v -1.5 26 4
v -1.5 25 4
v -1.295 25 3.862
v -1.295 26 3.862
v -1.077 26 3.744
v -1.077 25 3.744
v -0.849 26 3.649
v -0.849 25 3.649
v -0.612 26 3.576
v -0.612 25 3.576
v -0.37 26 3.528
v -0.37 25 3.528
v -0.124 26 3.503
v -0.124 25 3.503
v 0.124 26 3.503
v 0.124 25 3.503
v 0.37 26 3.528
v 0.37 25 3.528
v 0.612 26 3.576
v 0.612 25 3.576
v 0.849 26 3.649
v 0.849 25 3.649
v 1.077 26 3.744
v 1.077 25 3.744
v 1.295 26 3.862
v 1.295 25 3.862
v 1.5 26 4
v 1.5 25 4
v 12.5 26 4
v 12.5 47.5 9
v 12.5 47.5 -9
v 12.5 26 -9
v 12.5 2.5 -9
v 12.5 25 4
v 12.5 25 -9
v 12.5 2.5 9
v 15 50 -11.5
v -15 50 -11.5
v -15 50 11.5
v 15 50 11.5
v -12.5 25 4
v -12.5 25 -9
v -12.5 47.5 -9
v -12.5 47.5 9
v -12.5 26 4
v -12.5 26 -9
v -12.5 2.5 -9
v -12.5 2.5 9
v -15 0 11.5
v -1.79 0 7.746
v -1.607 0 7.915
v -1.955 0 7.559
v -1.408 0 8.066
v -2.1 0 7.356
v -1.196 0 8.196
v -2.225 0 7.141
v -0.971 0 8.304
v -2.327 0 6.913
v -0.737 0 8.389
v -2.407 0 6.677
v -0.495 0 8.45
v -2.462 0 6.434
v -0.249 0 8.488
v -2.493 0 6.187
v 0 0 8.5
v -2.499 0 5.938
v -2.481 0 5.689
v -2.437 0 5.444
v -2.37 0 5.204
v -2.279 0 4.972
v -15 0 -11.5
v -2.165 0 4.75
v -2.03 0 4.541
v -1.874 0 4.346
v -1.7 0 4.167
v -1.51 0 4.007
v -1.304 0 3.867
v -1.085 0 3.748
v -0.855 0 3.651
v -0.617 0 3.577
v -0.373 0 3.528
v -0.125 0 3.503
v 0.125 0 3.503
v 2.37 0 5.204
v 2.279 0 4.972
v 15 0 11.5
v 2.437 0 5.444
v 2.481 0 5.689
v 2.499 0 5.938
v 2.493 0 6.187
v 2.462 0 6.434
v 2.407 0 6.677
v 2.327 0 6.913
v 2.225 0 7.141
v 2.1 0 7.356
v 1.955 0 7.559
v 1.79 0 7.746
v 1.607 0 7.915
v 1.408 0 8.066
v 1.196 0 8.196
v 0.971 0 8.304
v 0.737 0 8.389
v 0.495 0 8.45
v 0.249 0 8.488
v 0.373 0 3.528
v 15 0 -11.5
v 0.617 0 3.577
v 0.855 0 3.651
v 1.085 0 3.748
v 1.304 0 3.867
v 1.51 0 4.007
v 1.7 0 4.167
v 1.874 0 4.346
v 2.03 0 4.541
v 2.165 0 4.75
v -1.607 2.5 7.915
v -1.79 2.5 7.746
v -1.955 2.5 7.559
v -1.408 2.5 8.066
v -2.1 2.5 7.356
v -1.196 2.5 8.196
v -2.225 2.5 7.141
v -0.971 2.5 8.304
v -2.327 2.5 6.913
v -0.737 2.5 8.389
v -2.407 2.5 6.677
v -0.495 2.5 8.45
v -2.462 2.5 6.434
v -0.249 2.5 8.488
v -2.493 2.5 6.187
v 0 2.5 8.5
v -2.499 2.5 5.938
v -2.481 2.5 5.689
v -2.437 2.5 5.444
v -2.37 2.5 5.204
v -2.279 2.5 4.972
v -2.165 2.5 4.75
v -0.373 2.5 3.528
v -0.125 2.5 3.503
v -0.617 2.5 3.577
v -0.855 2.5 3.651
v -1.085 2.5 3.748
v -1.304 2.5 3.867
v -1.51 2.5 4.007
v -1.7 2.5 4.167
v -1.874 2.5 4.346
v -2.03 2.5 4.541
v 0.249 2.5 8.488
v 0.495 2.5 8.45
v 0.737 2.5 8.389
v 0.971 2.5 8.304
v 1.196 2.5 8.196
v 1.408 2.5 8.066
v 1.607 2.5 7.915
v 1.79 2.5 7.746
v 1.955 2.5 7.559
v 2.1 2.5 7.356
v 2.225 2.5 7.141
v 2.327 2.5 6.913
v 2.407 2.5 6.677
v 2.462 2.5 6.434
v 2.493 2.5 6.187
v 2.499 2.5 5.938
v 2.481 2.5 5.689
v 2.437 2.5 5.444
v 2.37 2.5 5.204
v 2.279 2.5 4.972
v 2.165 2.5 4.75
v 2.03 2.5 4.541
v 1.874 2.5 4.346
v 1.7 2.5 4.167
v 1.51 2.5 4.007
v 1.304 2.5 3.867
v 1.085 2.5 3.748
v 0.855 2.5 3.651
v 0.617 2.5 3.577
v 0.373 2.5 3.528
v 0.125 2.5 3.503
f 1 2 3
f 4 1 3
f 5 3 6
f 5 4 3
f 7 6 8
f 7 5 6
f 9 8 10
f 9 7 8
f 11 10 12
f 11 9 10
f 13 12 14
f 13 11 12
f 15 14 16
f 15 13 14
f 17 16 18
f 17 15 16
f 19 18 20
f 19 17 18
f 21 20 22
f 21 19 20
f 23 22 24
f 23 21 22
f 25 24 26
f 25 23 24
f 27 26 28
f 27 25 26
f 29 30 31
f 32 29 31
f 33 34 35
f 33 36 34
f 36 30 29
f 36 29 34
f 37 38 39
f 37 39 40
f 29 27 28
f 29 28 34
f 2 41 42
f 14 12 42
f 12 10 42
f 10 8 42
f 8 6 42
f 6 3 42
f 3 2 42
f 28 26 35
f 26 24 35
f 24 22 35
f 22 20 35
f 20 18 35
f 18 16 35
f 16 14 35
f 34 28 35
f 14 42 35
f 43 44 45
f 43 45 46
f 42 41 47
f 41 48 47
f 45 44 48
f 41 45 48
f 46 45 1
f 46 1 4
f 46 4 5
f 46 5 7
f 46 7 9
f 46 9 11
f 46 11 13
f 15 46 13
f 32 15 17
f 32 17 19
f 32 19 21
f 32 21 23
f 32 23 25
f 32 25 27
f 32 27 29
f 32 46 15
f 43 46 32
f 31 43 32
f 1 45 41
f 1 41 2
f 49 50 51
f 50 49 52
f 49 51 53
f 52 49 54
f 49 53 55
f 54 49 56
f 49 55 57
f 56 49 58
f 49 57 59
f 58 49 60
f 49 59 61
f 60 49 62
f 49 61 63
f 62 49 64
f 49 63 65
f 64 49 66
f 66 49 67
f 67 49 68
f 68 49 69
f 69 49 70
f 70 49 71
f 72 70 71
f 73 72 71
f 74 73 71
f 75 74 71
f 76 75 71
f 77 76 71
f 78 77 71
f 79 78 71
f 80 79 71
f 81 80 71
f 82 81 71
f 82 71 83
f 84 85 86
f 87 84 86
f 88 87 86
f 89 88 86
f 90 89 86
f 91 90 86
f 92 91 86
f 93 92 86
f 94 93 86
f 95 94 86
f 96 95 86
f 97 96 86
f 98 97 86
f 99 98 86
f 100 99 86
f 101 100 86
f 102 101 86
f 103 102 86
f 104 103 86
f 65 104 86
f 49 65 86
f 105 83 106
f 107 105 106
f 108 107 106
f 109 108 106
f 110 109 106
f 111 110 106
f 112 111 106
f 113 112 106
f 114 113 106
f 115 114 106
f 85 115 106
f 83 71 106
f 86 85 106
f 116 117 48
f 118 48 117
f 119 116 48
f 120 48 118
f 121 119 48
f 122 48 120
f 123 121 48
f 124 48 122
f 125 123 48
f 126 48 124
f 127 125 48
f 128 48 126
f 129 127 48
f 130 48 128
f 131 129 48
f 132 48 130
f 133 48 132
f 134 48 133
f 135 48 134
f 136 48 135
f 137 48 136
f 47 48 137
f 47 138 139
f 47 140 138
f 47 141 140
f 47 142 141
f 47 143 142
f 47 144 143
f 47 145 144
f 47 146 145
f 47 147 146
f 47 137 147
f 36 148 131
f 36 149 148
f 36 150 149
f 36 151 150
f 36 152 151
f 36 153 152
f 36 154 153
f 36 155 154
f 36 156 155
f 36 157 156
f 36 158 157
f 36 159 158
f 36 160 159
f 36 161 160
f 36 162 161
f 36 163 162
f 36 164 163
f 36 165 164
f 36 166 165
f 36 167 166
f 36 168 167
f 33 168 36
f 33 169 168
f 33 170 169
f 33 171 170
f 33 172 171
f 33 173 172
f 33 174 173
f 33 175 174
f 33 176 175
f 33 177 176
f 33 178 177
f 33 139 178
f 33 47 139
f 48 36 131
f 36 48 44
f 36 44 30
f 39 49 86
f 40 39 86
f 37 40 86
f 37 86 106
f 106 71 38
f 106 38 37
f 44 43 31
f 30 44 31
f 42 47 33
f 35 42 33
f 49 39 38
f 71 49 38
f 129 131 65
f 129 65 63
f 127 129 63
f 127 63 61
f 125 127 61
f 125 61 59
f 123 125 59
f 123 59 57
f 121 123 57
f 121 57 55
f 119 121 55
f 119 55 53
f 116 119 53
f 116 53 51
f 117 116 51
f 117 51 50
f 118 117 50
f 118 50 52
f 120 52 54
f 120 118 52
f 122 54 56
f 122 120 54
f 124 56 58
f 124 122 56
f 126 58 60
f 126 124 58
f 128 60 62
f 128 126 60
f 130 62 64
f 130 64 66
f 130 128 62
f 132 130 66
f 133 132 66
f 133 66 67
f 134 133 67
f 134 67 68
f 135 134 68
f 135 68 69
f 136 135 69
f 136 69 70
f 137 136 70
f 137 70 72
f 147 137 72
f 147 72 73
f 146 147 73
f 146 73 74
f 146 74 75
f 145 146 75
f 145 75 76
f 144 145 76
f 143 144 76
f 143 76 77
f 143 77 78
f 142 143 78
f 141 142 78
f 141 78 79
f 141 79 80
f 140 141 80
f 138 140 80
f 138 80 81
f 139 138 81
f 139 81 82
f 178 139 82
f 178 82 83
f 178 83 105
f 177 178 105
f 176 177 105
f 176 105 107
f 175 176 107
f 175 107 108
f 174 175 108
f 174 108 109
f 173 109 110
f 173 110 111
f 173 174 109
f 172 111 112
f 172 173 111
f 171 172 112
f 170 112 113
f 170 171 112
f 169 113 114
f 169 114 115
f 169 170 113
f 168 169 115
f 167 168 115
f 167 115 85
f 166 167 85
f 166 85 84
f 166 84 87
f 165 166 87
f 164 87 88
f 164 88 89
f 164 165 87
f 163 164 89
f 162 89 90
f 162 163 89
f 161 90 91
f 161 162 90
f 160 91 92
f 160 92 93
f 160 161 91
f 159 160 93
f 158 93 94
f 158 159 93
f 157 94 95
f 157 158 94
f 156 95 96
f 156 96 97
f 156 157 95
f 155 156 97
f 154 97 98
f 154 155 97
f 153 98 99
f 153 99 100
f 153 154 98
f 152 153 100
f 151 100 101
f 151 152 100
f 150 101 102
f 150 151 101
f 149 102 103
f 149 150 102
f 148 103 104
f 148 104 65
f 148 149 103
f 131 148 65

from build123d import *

# Parameters (mm, degrees)
SKETCH1_W           = 30
SKETCH1_H           = 23
BOSS_EXTRUDE1_DEPTH = 50
CUT_EXTRUDE2_START  = 2.5
SKETCH1_5_W         = 25
SKETCH1_5_H         = 18
CUT_EXTRUDE2_DEPTH  = 45
BOSS_EXTRUDE3_START = 25
SKETCH1_6_W         = 25
SKETCH1_6_H         = 18
BOSS_EXTRUDE3_DEPTH = 1
CUT_EXTRUDE3_START  = 21.5
SKETCH2_R           = 2.5
CUT_EXTRUDE3_DEPTH  = 26
SKETCH4_W           = 25
SKETCH4_H           = 5
CUT_EXTRUDE4_DEPTH  = 1


with BuildPart() as part:
    # Sketch1 → Boss-Extrude1 (new body)
    with BuildSketch(Plane(origin=(0, 0, 0), x_dir=(1, 0, 0), z_dir=(0, 1, 0))):
        Rectangle(SKETCH1_W, SKETCH1_H)
    extrude(amount=BOSS_EXTRUDE1_DEPTH)

    # Sketch1<5> → Cut-Extrude2 (cut)
    with BuildSketch(Plane(origin=(0, 0, 0), x_dir=(1, 0, 0), z_dir=(0, 1, 0)).offset(CUT_EXTRUDE2_START)):
        Rectangle(SKETCH1_5_W, SKETCH1_5_H)
    extrude(amount=CUT_EXTRUDE2_DEPTH, mode=Mode.SUBTRACT)

    # Sketch1<6> → Boss-Extrude3 (add)
    with BuildSketch(Plane(origin=(0, 0, 0), x_dir=(1, 0, 0), z_dir=(0, 1, 0)).offset(BOSS_EXTRUDE3_START)):
        Rectangle(SKETCH1_6_W, SKETCH1_6_H)
    extrude(amount=BOSS_EXTRUDE3_DEPTH)

    # Sketch2 → Cut-Extrude3 (cut)
    with BuildSketch(Plane(origin=(0, 47.5, 0), x_dir=(-1, 0, 0), z_dir=(0, -1, 0)).offset(CUT_EXTRUDE3_START)):
        with Locations(Location((0, -6, 0), (0, 0, 270))):
            Circle(SKETCH2_R)
    extrude(amount=CUT_EXTRUDE3_DEPTH, mode=Mode.SUBTRACT)

    # Sketch4 → Cut-Extrude4 (cut)
    with BuildSketch(Plane(origin=(0, 26, 0), x_dir=(1, 0, 0), z_dir=(0, 1, 0))):
        with Locations((0, -6.5)):
            Rectangle(SKETCH4_W, SKETCH4_H)
    extrude(amount=-CUT_EXTRUDE4_DEPTH, mode=Mode.SUBTRACT)


solid = part.part
